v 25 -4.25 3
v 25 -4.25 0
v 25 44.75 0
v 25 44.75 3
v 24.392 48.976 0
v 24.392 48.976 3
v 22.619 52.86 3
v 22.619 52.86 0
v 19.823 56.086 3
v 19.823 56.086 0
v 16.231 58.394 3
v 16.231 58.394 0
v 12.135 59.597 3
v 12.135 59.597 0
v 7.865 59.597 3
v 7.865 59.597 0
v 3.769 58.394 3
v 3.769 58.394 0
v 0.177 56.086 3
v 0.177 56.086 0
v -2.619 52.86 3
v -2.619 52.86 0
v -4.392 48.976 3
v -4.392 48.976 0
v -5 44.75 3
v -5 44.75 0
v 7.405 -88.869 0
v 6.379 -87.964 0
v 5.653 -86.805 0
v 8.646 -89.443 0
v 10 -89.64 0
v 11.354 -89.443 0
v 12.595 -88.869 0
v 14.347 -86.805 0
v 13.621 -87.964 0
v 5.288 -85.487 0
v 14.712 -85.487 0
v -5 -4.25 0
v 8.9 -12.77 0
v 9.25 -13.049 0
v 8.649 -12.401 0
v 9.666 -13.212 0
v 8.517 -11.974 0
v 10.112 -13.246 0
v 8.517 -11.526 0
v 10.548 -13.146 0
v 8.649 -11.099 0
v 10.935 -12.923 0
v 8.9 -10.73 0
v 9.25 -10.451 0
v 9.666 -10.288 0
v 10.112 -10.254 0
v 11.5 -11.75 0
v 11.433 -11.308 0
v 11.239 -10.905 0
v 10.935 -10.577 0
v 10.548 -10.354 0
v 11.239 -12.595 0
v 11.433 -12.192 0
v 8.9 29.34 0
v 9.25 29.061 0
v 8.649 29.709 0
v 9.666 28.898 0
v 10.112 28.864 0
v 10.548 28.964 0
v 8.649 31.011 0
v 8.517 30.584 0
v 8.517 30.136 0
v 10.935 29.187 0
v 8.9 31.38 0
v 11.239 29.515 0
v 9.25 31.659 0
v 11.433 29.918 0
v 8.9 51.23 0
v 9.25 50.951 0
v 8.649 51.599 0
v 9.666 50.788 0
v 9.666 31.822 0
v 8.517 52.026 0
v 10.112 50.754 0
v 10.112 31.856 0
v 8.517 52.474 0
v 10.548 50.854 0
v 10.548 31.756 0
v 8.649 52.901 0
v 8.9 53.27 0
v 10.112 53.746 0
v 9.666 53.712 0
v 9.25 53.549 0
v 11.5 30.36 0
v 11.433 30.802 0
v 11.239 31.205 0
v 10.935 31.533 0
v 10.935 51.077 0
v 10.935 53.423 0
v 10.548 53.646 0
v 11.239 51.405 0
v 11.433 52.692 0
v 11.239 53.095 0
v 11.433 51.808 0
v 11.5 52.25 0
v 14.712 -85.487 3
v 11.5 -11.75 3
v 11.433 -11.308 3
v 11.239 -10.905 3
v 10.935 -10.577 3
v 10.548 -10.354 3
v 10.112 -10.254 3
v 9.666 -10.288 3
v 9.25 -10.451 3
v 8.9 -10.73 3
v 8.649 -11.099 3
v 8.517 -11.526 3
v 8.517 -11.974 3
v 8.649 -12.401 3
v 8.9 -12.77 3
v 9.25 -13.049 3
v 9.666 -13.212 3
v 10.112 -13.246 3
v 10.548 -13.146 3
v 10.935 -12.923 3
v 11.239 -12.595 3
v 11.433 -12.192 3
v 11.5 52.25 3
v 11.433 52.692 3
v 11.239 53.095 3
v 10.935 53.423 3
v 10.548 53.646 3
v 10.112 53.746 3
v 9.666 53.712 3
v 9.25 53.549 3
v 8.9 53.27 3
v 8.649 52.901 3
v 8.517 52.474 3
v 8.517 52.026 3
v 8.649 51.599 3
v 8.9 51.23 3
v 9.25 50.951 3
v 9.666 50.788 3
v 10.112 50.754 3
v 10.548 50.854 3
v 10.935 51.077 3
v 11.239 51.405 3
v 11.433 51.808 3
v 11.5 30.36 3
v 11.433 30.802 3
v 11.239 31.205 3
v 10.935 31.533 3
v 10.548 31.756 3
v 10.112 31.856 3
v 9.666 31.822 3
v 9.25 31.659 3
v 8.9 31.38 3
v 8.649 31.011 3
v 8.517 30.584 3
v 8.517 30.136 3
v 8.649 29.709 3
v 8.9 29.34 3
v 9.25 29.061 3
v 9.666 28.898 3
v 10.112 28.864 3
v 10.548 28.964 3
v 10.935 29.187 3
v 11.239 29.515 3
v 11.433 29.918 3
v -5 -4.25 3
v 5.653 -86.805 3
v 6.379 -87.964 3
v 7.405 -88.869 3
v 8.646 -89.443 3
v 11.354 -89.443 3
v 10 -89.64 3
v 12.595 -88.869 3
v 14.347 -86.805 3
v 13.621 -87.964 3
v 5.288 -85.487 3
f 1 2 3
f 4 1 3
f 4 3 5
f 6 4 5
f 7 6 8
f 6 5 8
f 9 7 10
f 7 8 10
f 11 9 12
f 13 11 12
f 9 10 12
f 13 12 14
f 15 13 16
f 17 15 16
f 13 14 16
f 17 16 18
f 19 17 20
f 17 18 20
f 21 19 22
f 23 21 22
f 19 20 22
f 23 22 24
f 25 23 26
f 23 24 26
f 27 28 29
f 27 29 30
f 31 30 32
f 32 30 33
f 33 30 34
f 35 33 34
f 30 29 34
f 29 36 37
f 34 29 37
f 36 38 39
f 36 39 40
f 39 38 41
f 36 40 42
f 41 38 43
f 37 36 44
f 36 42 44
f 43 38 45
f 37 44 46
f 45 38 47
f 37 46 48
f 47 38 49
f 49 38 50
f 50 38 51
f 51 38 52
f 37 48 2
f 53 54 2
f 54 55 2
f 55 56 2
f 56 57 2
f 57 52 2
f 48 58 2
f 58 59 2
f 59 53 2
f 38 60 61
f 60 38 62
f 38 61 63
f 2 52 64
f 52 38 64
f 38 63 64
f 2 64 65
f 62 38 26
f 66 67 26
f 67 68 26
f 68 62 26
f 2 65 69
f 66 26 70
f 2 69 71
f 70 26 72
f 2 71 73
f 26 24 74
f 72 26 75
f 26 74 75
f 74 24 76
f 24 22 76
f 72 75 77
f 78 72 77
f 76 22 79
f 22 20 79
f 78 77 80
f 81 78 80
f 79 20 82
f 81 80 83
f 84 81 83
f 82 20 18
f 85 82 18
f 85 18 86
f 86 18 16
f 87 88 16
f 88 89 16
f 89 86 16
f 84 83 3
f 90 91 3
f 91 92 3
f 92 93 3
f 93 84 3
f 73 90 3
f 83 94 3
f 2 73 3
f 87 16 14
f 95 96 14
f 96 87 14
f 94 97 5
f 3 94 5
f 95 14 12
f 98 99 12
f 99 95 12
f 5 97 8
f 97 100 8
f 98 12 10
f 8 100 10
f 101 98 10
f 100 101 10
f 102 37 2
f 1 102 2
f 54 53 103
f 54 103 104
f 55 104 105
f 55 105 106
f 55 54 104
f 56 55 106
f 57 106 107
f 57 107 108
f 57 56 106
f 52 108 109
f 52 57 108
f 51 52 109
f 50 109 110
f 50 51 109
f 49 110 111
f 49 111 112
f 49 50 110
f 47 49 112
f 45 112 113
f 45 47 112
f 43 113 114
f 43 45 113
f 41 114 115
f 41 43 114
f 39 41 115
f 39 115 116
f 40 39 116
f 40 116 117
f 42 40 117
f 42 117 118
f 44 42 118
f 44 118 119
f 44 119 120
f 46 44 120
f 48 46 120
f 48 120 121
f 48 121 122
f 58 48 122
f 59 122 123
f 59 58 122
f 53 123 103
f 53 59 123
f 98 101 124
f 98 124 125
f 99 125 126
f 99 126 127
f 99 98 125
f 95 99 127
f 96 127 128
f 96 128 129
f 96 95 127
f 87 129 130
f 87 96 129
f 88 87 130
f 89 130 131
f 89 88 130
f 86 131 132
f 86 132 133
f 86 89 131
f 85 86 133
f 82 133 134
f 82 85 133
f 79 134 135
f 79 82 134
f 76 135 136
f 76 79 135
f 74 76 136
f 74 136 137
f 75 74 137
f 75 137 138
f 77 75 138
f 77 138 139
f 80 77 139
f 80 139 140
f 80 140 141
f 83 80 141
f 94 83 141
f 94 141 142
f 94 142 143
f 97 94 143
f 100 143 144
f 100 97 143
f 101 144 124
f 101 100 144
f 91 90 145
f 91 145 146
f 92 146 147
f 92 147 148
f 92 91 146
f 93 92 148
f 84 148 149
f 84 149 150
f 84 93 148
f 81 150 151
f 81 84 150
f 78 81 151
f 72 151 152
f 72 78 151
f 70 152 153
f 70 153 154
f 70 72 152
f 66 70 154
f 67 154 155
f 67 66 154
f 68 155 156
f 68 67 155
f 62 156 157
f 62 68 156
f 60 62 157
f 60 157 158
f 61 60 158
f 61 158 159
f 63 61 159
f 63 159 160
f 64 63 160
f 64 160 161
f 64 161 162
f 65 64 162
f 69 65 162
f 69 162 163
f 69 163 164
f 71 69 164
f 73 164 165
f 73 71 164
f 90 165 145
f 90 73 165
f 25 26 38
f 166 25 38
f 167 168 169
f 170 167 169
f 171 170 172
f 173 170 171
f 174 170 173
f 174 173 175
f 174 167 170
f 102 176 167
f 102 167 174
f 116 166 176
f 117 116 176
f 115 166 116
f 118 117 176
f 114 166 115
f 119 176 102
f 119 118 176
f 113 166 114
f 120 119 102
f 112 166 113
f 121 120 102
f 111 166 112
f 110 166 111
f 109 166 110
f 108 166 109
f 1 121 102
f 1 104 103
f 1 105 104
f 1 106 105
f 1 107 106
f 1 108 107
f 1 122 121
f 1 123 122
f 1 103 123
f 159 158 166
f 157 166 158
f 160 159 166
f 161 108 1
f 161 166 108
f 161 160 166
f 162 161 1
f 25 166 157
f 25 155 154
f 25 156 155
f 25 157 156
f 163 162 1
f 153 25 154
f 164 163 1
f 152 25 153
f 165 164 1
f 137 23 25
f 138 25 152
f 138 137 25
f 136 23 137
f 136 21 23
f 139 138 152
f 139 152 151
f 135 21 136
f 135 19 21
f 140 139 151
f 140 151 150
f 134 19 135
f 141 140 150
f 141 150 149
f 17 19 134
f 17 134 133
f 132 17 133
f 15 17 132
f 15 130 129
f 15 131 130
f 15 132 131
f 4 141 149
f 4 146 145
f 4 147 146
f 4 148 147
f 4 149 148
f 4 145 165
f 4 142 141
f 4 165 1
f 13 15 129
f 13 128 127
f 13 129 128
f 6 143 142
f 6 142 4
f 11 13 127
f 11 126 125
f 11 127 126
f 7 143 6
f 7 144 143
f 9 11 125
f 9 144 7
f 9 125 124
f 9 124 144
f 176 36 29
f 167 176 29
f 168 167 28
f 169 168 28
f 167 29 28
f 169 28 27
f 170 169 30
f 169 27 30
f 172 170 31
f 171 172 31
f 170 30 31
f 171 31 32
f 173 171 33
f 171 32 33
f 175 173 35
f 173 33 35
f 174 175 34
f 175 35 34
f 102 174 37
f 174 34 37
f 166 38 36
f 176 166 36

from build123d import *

# Parameters (mm, degrees)
SKETCH1_R           = 1.5
BOSS_EXTRUDE1_DEPTH = 3


with BuildPart() as part:
    # Sketch1 → Boss-Extrude1 (new body)
    with BuildSketch(Plane.XY):
        with BuildLine():
            Line((-5, 44.75), (-5, -4.25))
            Line((-5, -4.25), (5.287636044, -85.486762889))
            ThreePointArc((5.287636044, -85.486762889), (10, -89.64), (14.712363956, -85.486762889))
            Line((14.712363956, -85.486762889), (25, -4.25))
            Line((25, -4.25), (25, 44.75))
            ThreePointArc((25, 44.75), (10, 59.75), (-5, 44.75))
        make_face()
        with Locations((10, 30.36)):
            Circle(SKETCH1_R, mode=Mode.SUBTRACT)
        with Locations((10, 52.25)):
            Circle(SKETCH1_R, mode=Mode.SUBTRACT)
        with Locations((10, -11.75)):
            Circle(SKETCH1_R, mode=Mode.SUBTRACT)
    extrude(amount=BOSS_EXTRUDE1_DEPTH)


solid = part.part
